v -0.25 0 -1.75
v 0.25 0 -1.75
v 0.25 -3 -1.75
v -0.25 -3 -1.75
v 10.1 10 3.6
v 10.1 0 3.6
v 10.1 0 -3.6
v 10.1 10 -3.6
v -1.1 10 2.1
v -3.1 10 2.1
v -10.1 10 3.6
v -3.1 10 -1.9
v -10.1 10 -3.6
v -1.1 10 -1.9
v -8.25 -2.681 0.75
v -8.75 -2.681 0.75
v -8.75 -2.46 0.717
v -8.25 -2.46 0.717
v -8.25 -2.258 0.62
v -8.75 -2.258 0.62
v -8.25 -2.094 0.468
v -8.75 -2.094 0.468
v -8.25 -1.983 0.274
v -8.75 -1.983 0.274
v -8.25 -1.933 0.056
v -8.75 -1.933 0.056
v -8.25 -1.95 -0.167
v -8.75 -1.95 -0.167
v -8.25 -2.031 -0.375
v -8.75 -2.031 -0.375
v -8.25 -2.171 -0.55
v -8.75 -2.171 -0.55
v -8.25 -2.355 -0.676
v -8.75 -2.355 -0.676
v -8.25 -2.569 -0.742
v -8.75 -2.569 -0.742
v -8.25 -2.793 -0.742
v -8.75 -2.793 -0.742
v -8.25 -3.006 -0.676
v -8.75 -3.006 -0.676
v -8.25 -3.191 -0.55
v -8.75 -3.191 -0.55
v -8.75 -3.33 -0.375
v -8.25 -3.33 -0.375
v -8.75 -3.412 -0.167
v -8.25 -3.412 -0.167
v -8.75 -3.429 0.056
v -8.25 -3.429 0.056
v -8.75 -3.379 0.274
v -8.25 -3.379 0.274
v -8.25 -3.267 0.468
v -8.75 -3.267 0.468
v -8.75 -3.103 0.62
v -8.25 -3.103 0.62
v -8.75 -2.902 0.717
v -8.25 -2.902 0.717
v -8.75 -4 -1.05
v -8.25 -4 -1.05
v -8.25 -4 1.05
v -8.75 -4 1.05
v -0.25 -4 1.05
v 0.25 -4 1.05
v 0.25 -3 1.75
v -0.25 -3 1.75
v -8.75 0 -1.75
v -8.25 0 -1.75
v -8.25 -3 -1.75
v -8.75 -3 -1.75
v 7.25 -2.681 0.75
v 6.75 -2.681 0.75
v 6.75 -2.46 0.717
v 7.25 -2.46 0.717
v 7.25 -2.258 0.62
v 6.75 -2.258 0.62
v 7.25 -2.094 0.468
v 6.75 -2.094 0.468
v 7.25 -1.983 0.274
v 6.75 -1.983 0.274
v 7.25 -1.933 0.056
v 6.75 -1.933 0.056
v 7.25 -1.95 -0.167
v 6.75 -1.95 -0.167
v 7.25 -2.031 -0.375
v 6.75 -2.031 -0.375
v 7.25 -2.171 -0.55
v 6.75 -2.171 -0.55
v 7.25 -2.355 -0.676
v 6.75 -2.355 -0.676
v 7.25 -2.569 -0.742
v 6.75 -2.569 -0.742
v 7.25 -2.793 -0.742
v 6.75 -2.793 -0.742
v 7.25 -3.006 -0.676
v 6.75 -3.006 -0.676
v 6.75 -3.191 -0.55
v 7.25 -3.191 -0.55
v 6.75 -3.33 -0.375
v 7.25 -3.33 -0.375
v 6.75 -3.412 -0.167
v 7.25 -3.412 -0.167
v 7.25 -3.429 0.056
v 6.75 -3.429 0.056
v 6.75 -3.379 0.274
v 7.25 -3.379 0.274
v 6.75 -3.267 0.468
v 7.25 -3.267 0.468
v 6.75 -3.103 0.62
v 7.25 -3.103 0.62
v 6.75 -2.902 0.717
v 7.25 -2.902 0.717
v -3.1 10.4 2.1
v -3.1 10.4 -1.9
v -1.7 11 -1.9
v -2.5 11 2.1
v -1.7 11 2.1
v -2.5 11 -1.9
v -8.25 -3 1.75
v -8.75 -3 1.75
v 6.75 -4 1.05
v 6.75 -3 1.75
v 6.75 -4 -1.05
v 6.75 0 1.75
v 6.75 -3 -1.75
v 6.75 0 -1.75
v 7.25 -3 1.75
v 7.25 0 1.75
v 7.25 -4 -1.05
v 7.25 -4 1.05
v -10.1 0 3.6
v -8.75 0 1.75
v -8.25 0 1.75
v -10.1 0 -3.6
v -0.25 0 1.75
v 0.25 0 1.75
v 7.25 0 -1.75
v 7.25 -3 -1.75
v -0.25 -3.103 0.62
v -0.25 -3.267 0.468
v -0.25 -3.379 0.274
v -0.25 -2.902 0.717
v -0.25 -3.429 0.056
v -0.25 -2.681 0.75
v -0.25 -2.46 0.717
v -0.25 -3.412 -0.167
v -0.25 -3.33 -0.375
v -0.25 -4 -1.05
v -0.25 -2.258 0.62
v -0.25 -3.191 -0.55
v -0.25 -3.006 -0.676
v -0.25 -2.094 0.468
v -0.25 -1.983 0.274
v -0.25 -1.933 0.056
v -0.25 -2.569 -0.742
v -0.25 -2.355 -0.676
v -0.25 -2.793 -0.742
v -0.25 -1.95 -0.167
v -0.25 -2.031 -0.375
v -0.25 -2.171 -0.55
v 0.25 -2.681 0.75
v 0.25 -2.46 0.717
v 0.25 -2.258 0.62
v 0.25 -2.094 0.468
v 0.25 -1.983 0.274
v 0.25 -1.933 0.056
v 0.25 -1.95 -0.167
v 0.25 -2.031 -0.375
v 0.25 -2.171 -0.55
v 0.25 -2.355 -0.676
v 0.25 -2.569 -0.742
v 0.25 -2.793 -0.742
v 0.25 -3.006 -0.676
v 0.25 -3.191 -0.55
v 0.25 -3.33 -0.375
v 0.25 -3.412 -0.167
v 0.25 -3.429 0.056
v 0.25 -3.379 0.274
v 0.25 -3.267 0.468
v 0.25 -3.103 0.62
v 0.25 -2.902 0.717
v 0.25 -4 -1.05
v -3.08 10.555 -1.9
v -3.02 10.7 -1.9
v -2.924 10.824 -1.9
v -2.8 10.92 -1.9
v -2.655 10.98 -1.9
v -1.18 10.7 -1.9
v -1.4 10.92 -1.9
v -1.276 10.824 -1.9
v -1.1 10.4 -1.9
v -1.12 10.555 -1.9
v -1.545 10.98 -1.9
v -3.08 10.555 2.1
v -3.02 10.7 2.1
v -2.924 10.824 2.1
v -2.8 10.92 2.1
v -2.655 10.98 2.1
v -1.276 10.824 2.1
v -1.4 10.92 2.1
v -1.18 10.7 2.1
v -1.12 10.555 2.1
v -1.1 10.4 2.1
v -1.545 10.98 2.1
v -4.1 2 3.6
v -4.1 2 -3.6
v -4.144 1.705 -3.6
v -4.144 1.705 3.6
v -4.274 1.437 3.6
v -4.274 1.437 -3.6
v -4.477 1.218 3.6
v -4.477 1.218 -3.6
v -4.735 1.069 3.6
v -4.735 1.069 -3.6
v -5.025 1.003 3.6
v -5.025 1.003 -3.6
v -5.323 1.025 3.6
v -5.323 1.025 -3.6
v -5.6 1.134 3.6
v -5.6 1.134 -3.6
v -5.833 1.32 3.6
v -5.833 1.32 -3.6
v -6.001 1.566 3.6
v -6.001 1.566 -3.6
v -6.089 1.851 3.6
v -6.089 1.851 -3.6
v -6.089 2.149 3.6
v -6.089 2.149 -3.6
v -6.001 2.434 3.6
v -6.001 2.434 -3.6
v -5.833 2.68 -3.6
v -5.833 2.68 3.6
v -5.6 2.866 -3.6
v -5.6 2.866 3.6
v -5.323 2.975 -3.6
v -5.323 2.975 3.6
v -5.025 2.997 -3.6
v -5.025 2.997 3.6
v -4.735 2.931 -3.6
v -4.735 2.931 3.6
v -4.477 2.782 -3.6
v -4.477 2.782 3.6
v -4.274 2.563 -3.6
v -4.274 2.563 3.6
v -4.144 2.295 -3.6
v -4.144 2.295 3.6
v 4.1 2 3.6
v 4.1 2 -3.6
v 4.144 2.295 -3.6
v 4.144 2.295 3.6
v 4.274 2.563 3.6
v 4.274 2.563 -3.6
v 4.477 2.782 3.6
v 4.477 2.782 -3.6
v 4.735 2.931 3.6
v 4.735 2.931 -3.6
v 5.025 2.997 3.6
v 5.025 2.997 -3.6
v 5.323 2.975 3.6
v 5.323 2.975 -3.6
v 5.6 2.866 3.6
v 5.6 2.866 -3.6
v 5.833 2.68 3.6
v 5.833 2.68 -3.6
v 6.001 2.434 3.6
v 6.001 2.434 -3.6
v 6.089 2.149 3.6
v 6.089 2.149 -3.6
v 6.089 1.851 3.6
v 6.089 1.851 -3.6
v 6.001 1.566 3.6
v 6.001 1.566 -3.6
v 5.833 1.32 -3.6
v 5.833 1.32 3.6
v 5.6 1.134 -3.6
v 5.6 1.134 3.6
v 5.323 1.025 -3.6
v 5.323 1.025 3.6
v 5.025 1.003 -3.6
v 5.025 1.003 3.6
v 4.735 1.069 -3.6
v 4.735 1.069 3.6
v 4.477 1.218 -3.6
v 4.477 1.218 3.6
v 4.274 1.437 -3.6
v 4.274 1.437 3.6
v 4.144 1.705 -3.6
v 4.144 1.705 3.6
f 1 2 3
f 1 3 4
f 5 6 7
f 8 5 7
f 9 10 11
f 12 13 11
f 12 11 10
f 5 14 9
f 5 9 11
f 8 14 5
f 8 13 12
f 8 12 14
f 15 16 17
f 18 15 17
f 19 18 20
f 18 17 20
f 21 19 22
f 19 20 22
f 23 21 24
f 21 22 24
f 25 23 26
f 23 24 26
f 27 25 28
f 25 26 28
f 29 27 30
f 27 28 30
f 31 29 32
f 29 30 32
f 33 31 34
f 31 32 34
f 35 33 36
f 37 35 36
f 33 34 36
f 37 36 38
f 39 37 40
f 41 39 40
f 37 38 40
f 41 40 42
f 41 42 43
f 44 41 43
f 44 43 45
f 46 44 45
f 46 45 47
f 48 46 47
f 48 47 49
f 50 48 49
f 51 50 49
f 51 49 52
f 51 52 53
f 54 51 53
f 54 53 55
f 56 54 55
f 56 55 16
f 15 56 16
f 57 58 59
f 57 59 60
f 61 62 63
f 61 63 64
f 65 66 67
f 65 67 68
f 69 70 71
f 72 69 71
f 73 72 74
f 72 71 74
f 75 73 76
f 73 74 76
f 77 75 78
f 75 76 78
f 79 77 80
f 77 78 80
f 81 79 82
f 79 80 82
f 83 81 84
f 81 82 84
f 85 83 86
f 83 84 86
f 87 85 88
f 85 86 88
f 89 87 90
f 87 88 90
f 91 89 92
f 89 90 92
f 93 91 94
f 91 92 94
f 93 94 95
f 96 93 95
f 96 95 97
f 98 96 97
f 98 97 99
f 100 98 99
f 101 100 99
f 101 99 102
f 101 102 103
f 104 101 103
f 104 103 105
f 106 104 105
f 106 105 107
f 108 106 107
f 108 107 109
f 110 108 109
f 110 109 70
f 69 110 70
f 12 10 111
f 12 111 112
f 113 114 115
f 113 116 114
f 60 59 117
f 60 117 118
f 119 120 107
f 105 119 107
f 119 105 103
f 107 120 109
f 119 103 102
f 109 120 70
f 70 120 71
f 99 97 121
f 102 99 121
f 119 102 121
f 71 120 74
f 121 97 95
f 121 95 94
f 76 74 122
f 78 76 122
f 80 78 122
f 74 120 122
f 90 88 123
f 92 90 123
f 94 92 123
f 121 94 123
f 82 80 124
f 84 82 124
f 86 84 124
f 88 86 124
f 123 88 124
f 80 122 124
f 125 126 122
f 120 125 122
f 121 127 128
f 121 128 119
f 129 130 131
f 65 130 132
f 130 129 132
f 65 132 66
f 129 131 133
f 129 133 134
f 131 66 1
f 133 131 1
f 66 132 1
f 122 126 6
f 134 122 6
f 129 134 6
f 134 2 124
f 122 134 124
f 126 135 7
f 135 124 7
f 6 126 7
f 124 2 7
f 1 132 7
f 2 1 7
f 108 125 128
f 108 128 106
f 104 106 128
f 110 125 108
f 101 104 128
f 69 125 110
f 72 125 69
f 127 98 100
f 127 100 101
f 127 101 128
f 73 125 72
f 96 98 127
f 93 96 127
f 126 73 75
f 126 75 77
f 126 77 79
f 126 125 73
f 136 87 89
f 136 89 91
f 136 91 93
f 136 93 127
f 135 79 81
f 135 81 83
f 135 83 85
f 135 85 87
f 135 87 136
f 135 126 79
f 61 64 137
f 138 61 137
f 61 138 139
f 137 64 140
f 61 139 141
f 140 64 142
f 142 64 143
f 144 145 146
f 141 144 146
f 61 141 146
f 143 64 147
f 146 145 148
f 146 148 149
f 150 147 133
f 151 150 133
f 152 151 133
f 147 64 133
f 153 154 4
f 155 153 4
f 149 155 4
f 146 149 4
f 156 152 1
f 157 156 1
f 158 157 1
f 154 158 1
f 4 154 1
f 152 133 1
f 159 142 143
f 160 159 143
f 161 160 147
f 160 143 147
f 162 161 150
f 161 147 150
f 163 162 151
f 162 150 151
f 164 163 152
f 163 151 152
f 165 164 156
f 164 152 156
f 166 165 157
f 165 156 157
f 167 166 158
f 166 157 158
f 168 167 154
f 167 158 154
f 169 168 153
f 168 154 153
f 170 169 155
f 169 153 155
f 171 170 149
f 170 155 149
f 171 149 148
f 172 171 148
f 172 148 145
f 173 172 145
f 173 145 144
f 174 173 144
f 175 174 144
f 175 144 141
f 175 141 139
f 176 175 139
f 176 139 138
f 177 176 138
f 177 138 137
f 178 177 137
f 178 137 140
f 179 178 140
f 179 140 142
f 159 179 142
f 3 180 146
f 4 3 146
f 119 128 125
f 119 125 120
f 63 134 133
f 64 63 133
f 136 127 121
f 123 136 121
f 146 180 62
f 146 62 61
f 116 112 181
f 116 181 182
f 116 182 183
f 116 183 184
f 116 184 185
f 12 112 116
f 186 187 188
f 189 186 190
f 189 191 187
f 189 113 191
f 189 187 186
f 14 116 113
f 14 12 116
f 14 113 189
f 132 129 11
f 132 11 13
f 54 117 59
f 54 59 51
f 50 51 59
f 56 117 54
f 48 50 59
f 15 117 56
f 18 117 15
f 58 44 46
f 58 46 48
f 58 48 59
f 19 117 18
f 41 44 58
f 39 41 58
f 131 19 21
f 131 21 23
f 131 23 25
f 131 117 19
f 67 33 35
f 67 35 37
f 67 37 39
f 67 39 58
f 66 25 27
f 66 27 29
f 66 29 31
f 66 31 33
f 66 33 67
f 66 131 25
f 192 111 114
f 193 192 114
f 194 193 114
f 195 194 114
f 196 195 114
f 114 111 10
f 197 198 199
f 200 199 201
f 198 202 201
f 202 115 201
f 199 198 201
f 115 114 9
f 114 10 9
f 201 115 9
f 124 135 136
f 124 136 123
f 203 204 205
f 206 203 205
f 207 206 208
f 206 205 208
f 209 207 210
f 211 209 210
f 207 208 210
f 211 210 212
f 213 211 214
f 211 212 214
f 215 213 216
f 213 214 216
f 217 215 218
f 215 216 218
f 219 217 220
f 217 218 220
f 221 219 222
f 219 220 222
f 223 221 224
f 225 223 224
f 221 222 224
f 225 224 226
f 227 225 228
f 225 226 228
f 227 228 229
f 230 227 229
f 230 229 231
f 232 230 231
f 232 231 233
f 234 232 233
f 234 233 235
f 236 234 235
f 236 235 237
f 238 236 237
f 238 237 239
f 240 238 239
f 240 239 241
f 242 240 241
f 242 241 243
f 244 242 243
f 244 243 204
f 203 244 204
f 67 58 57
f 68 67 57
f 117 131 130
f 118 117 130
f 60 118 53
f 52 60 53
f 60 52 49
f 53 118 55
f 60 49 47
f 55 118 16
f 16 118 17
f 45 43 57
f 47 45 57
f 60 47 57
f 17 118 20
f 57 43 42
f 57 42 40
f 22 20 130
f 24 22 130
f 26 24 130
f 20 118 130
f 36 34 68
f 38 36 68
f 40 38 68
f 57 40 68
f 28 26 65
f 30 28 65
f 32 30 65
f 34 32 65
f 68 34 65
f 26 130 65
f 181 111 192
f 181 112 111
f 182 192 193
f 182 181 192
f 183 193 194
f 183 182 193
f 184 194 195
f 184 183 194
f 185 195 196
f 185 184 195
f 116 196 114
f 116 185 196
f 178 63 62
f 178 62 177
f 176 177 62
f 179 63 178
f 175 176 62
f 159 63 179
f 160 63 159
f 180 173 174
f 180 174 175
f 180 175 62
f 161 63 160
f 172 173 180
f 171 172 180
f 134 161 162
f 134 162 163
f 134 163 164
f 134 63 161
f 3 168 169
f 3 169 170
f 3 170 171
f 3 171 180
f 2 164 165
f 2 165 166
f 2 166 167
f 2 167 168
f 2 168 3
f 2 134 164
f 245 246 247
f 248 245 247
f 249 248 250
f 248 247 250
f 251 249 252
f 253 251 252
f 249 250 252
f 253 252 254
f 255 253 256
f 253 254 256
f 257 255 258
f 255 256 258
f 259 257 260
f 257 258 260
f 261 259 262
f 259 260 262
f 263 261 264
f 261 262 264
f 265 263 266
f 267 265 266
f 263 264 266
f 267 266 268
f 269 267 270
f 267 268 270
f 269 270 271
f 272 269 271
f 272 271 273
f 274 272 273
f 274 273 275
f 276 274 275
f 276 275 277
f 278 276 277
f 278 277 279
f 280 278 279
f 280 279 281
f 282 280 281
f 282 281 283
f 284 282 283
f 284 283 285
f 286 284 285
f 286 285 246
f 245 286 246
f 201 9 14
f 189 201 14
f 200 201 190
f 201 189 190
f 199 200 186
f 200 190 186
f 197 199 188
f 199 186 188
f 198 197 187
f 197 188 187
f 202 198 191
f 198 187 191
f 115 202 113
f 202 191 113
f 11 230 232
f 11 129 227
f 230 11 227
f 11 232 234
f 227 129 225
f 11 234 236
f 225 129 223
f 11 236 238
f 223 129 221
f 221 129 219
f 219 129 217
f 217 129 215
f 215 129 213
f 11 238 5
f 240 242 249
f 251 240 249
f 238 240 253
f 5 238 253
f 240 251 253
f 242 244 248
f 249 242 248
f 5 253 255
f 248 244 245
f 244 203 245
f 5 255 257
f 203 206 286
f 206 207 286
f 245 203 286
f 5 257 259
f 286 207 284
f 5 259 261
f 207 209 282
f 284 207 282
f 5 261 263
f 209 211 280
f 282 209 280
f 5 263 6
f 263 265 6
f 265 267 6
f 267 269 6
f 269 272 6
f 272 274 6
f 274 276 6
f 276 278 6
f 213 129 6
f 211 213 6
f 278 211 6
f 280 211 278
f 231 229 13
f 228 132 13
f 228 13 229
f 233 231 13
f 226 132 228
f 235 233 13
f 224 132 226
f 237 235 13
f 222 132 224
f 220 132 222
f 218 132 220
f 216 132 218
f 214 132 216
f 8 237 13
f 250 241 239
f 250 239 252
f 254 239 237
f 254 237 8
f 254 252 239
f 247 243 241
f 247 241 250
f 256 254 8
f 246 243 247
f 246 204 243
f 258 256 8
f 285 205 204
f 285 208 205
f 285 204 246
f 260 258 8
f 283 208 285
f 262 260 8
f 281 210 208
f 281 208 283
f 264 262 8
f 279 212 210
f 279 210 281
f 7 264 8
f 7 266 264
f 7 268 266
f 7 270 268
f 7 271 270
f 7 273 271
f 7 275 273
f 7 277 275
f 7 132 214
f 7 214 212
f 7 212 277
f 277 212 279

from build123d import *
from OCP.BRepFilletAPI import BRepFilletAPI_MakeChamfer

# Parameters (mm, degrees)
SKETCH_1_W          = 20.2
SKETCH_1_H          = 7.2
EXTRUDE_1_DEPTH     = 10
SKETCH_2_W          = 0.5
SKETCH_2_H          = 3.5
EXTRUDE_2_DEPTH     = 4
CUT_EXTRUDE_1_REACH = 23.64
SKETCH_3_R          = 0.75
CHAMFER_1_SIZE      = 1
CHAMFER_1_SIZE2     = 0.700207538
SKETCH_4_R          = 1
CUT_EXTRUDE_2_DEPTH = 16.932670837
SKETCH_5_W          = 2
SKETCH_5_H          = 4
EXTRUDE_3_DEPTH     = 1
FILLET_1_R          = 0.6


with BuildPart() as part:
    # Эскиз1 → Бобышка-Вытянуть1 (new body)
    with BuildSketch(Plane(origin=(0, 0, 0), x_dir=(1, 0, 0), z_dir=(0, 1, 0))):
        Rectangle(SKETCH_1_W, SKETCH_1_H)
    extrude(amount=EXTRUDE_1_DEPTH)

    # Эскиз2 → Бобышка-Вытянуть2 (add)
    with BuildSketch(Plane(origin=(0, 0, 0), x_dir=(-1, 0, 0), z_dir=(0, -1, 0))):
        with Locations((-7, 0)):
            Rectangle(SKETCH_2_W, SKETCH_2_H)
        Rectangle(SKETCH_2_W, SKETCH_2_H)
        with Locations((8.5, 0)):
            Rectangle(SKETCH_2_W, SKETCH_2_H)
    extrude(amount=EXTRUDE_2_DEPTH)

    # Вырез-Вытянуть1: up to this face of the body (flat: up to its plane)
    cut_extrude_1_end = Plane(part.part.faces().sort_by_distance((7.25, -2, 0))[0])
    # Эскиз3 → Вырез-Вытянуть1 (cut, up to the picked face)
    with BuildSketch(Plane.ZY.offset(8.75), mode=Mode.PRIVATE) as cut_extrude_1_sk1:
        with Locations((0, -2.680856865)):
            Circle(SKETCH_3_R)
    cut_extrude_1_tool1 = split(extrude(cut_extrude_1_sk1.sketch, amount=-CUT_EXTRUDE_1_REACH, mode=Mode.PRIVATE), bisect_by=cut_extrude_1_end, keep=Keep.BOTH, mode=Mode.PRIVATE)
    add(cut_extrude_1_tool1.solids().sort_by(Axis((-8.75, -2.680857, 0), (1, 0, 0)))[0], mode=Mode.SUBTRACT)

    # Фаска1: one chamfer whose edges measure the first distance from different faces: ONE call of the kernel's chamfer builder (chamfer() names one face for all edges)
    chamfer_1_edges_1 = [part.edges().sort_by_distance(p)[0] for p in [
        (0, -4, 1.75),
    ]]
    chamfer_1_side_1 = [part.faces().sort_by_distance(p)[0] for p in [
        (0, -2, 1.75),
    ]]
    chamfer_1_edges_2 = [part.edges().sort_by_distance(p)[0] for p in [
        (0, -4, -1.75),
    ]]
    chamfer_1_side_2 = [part.faces().sort_by_distance(p)[0] for p in [
        (0, -2, -1.75),
    ]]
    chamfer_1_edges_3 = [part.edges().sort_by_distance(p)[0] for p in [
        (7, -4, -1.75),
    ]]
    chamfer_1_side_3 = [part.faces().sort_by_distance(p)[0] for p in [
        (7, -2, -1.75),
    ]]
    chamfer_1_edges_4 = [part.edges().sort_by_distance(p)[0] for p in [
        (7, -4, 1.75),
    ]]
    chamfer_1_side_4 = [part.faces().sort_by_distance(p)[0] for p in [
        (7, -2, 1.75),
    ]]
    chamfer_1_edges_5 = [part.edges().sort_by_distance(p)[0] for p in [
        (-8.5, -4, -1.75),
    ]]
    chamfer_1_side_5 = [part.faces().sort_by_distance(p)[0] for p in [
        (-8.5, -2, -1.75),
    ]]
    chamfer_1_edges_6 = [part.edges().sort_by_distance(p)[0] for p in [
        (-8.5, -4, 1.75),
    ]]
    chamfer_1_side_6 = [part.faces().sort_by_distance(p)[0] for p in [
        (-8.5, -2, 1.75),
    ]]
    chamfer_1 = BRepFilletAPI_MakeChamfer(part.part.solid().wrapped)
    for e in chamfer_1_edges_1:
        chamfer_1.Add(CHAMFER_1_SIZE, CHAMFER_1_SIZE2, e.wrapped, chamfer_1_side_1[0].wrapped)  # the first distance lies on this face
    for e in chamfer_1_edges_2:
        chamfer_1.Add(CHAMFER_1_SIZE, CHAMFER_1_SIZE2, e.wrapped, chamfer_1_side_2[0].wrapped)  # the first distance lies on this face
    for e in chamfer_1_edges_3:
        chamfer_1.Add(CHAMFER_1_SIZE, CHAMFER_1_SIZE2, e.wrapped, chamfer_1_side_3[0].wrapped)  # the first distance lies on this face
    for e in chamfer_1_edges_4:
        chamfer_1.Add(CHAMFER_1_SIZE, CHAMFER_1_SIZE2, e.wrapped, chamfer_1_side_4[0].wrapped)  # the first distance lies on this face
    for e in chamfer_1_edges_5:
        chamfer_1.Add(CHAMFER_1_SIZE, CHAMFER_1_SIZE2, e.wrapped, chamfer_1_side_5[0].wrapped)  # the first distance lies on this face
    for e in chamfer_1_edges_6:
        chamfer_1.Add(CHAMFER_1_SIZE, CHAMFER_1_SIZE2, e.wrapped, chamfer_1_side_6[0].wrapped)  # the first distance lies on this face
    add(Compound.cast(chamfer_1.Shape()), mode=Mode.REPLACE)

    # Эскиз4 → Вырез-Вытянуть2 (cut, through all)
    with BuildSketch(Plane(origin=(0, 0, -3.6), x_dir=(-1, 0, 0), z_dir=(0, 0, -1))):
        with Locations((-5.1, 2)):
            Circle(SKETCH_4_R)
        with Locations(Location((5.1, 2, 0), (0, 0, 180))):
            Circle(SKETCH_4_R)
    extrude(amount=-CUT_EXTRUDE_2_DEPTH, mode=Mode.SUBTRACT)

    # Эскиз5 → Бобышка-Вытянуть3 (add)
    with BuildSketch(Plane(origin=(0, 10, 0), x_dir=(1, 0, 0), z_dir=(0, 1, 0))):
        with Locations((-2.1, -0.1)):
            Rectangle(SKETCH_5_W, SKETCH_5_H)
    extrude(amount=EXTRUDE_3_DEPTH)

    # Скругление1
    fillet_1_edges = [part.edges().sort_by_distance(p)[0] for p in [
        (-3.1, 11, 0.1),
        (-1.1, 11, 0.1),
    ]]
    fillet(fillet_1_edges, radius=FILLET_1_R)


solid = part.part
